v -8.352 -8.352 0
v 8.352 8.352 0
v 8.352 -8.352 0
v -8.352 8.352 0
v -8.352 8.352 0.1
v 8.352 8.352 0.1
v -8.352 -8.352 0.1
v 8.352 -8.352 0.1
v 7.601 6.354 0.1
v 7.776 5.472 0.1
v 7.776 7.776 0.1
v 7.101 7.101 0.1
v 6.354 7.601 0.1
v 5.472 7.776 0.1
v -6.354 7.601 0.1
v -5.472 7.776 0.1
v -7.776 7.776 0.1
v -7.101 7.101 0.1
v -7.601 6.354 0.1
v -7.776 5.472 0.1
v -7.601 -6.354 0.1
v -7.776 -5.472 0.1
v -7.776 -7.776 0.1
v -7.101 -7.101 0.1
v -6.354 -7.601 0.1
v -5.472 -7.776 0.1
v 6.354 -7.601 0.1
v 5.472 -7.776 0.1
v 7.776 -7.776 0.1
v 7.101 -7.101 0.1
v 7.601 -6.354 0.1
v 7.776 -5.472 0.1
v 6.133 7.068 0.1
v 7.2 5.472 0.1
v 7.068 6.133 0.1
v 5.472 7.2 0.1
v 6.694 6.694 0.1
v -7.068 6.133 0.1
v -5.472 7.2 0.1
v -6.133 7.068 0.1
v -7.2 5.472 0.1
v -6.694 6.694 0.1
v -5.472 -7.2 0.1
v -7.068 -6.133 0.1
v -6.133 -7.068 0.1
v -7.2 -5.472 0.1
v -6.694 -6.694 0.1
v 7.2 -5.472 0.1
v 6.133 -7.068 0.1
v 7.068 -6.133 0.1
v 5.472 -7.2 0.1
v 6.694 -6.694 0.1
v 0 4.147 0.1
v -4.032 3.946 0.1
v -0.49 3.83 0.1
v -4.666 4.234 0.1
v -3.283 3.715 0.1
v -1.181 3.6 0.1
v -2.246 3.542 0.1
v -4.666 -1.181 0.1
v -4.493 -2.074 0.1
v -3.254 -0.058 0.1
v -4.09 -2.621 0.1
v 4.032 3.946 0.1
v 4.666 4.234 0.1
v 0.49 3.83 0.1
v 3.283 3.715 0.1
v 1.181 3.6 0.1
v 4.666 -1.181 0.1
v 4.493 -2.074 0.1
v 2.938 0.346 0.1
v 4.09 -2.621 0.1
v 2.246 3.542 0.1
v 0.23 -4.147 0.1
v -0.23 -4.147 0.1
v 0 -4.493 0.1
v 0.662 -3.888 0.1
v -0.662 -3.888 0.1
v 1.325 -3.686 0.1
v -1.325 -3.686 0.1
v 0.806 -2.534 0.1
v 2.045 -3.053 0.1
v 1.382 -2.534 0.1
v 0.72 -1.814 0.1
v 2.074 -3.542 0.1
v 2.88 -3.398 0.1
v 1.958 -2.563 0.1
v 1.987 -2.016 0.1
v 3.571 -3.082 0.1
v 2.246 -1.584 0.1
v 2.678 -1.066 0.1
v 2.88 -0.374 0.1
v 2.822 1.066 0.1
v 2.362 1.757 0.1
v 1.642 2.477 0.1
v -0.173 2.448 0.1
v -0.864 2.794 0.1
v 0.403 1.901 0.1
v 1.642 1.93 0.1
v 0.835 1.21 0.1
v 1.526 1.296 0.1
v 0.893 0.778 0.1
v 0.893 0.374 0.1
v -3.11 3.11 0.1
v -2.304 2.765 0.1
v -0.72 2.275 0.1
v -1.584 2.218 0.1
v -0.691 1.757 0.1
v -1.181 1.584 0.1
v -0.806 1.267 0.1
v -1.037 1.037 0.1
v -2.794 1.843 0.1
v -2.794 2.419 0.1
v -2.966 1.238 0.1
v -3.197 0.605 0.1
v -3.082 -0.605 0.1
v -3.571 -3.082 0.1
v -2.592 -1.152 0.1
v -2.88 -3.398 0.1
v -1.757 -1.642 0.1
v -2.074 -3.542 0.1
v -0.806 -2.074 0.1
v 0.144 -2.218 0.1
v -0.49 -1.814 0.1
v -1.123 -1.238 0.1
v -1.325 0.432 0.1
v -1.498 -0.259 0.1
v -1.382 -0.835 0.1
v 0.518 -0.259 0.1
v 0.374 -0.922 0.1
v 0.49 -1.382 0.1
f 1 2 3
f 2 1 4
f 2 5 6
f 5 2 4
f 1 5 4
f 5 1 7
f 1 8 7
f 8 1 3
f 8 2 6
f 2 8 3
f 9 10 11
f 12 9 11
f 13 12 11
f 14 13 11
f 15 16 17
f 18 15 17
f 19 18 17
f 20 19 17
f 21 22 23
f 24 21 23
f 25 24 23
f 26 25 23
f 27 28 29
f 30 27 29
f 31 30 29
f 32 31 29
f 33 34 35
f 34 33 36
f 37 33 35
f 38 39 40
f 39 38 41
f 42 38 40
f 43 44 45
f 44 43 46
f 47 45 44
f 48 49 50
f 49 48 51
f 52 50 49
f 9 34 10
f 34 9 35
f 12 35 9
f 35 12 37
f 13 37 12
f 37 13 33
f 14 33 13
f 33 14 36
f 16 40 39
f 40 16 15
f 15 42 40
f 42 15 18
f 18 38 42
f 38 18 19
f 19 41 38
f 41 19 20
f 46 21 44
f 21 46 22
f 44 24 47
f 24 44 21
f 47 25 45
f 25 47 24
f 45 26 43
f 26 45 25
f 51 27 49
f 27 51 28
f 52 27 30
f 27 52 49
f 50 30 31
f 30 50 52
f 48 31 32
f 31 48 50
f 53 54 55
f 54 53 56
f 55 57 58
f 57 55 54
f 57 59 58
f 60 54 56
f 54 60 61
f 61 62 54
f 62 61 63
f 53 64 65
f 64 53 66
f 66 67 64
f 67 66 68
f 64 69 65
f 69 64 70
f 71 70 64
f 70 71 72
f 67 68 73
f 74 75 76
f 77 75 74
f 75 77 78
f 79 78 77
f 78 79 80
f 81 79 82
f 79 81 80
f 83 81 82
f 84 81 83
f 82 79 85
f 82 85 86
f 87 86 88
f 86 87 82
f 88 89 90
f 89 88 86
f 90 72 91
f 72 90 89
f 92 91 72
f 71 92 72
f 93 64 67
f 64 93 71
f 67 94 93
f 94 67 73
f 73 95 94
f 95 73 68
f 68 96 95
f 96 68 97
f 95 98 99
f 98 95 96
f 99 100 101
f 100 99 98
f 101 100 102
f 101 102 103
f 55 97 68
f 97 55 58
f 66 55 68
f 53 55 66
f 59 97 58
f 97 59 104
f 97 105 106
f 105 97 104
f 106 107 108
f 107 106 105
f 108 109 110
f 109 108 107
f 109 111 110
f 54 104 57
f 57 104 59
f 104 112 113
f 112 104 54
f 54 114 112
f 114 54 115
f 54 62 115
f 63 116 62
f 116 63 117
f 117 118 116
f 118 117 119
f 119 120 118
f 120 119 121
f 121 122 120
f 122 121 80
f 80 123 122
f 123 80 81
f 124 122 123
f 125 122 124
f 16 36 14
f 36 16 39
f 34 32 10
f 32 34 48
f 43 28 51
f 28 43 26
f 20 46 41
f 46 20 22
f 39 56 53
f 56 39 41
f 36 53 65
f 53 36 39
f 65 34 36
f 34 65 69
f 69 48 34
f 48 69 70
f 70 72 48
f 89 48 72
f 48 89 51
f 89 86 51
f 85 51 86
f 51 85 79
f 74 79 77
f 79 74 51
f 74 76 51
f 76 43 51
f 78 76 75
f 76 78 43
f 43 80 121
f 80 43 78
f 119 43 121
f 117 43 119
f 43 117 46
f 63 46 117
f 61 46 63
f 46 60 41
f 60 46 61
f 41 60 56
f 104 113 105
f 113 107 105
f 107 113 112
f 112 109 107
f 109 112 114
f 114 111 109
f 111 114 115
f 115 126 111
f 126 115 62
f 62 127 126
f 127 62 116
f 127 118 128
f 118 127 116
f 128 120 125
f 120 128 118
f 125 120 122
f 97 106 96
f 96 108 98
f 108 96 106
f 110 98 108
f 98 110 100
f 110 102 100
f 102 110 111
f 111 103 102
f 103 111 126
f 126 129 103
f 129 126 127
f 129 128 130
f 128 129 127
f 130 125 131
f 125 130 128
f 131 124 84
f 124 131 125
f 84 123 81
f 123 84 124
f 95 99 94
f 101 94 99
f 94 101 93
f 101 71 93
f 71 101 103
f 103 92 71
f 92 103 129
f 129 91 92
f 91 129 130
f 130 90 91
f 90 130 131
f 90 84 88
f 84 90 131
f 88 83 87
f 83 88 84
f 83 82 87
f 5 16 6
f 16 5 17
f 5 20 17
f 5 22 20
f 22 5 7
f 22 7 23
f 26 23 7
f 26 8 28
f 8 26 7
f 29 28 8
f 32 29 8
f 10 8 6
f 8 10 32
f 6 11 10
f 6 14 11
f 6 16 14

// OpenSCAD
// file: ../p/box5-12.scad
use <../lib.scad>
function ldraw_lib__box5_12() = [
// 0 Box with 5 Faces without Any Edges
// 0 Name: box5-12.dat
// 0 Author: Chris Dee [cwdee]
// 0 !LDRAW_ORG Primitive UPDATE 2009-02
// 0 !LICENSE Licensed under CC BY 4.0 : see CAreadme.txt
// 
// 0 BFC CERTIFY CCW
  [0,"BFC","CERTIFY"],
  [0,"BFC","CCW"],
// 
// 0 !HISTORY 2009-09-03 [PTadmin] Official Update 2009-02
// 
// 
// 4 16 1 1 1 1 1 -1 -1 1 -1 -1 1 1
  [4,16,1,1,1,1,1,-1,-1,1,-1,-1,1,1],
// 4 16 -1 0 1 1 0 1 1 1 1 -1 1 1
  [4,16,-1,0,1,1,0,1,1,1,1,-1,1,1],
// 4 16 -1 0 -1 -1 0 1 -1 1 1 -1 1 -1
  [4,16,-1,0,-1,-1,0,1,-1,1,1,-1,1,-1],
// 4 16 1 0 -1 -1 0 -1 -1 1 -1 1 1 -1
  [4,16,1,0,-1,-1,0,-1,-1,1,-1,1,1,-1],
// 4 16 1 0 1 1 0 -1 1 1 -1 1 1 1
  [4,16,1,0,1,1,0,-1,1,1,-1,1,1,1],
// 0
];
module ldraw_lib__box5_12(step=0, col=false, unit=2/5, alt=false, line=0.2, solid=!$preview)
    makepoly(ldraw_lib__box5_12(), step=step, col=col, unit=unit, alt=alt, line=line, solid=solid);
ldraw_lib__box5_12(line=0.2);
// file: ../p/1-4ring3.scad
use <../lib.scad>
function ldraw_lib__1_4ring3() = [
// 0 Ring  3 x 0.25
// 0 Name: 1-4ring3.dat
// 0 Author: Willy Tschager [Holly-Wood]
// 0 !LDRAW_ORG Primitive UPDATE 2024-01
// 0 !LICENSE Licensed under CC BY 4.0 : see CAreadme.txt
// 
// 0 BFC CERTIFY CCW
  [0,"BFC","CERTIFY"],
  [0,"BFC","CCW"],
// 
// 0 !HISTORY 1999-07-05 [PTadmin] Official Update 1999-05
// 0 !HISTORY 2003-01-21 [cavehop] Update Added BFC and 1 digit of significance
// 0 !HISTORY 2003-05-21 [cavehop] Corrected values as indicated by pneaster
// 0 !HISTORY 2003-06-12 [cavehop] Re-corrected values as indicated by pneaster
// 0 !HISTORY 2003-08-01 [PTadmin] Official Update 2003-02
// 0 !HISTORY 2007-06-22 [PTadmin] Header formatted for Contributor Agreement
// 0 !HISTORY 2008-07-01 [PTadmin] Official Update 2008-01
// 0 !HISTORY 2012-02-16 [Philo] Changed to CCW
// 0 !HISTORY 2012-03-30 [PTadmin] Official Update 2012-01
// 0 !HISTORY 2024-01-04 [Holly-Wood] Complete re-write, original by Karim Nassar
// 0 !HISTORY 2024-01-29 [OrionP] Official Update 2024-01
// 
// 4 16 4 0 0 3.6956 0 1.5308 2.7717 0 1.1481 3 0 0
  [4,16,4,0,0,3.6956,0,1.5308,2.7717,0,1.1481,3,0,0],
// 4 16 3.6956 0 1.5308 2.8284 0 2.8284 2.1213 0 2.1213 2.7717 0 1.1481
  [4,16,3.6956,0,1.5308,2.8284,0,2.8284,2.1213,0,2.1213,2.7717,0,1.1481],
// 4 16 2.8284 0 2.8284 1.5308 0 3.6956 1.1481 0 2.7717 2.1213 0 2.1213
  [4,16,2.8284,0,2.8284,1.5308,0,3.6956,1.1481,0,2.7717,2.1213,0,2.1213],
// 4 16 1.5308 0 3.6956 0 0 4 0 0 3 1.1481 0 2.7717
  [4,16,1.5308,0,3.6956,0,0,4,0,0,3,1.1481,0,2.7717],
// 0 // Build by LDPartEditor (PrimGen 2.X)
];
module ldraw_lib__1_4ring3(step=0, col=false, unit=2/5, alt=false, line=0.2, solid=!$preview)
    makepoly(ldraw_lib__1_4ring3(), step=step, col=col, unit=unit, alt=alt, line=line, solid=solid);
ldraw_lib__1_4ring3(line=0.2);
// file: ../p/1-4ndis.scad
use <../lib.scad>
function ldraw_lib__1_4ndis() = [
// 0 Disc Negative 0.25
// 0 Name: 1-4ndis.dat
// 0 Author: James Jessiman
// 0 !LDRAW_ORG Primitive UPDATE 2012-01
// 0 !LICENSE Licensed under CC BY 4.0 : see CAreadme.txt
// 
// 0 BFC CERTIFY CCW
  [0,"BFC","CERTIFY"],
  [0,"BFC","CCW"],
// 
// 0 !HISTORY 2002-03-23 [sbliss] Added BFC Statement
// 0 !HISTORY 2002-04-25 [PTadmin] Official Update 2002-02
// 0 !HISTORY 2007-06-22 [PTadmin] Header formatted for Contributor Agreement
// 0 !HISTORY 2008-07-01 [PTadmin] Official Update 2008-01
// 0 !HISTORY 2012-02-16 [Philo] Changed to CCW
// 0 !HISTORY 2012-03-30 [PTadmin] Official Update 2012-01
// 
// 
// 3 16 0.9239 0 0.3827 1 0 0 1 0 1
  [3,16,0.9239,0,0.3827,1,0,0,1,0,1],
// 3 16 0.7071 0 0.7071 0.9239 0 0.3827 1 0 1
  [3,16,0.7071,0,0.7071,0.9239,0,0.3827,1,0,1],
// 3 16 0.3827 0 0.9239 0.7071 0 0.7071 1 0 1
  [3,16,0.3827,0,0.9239,0.7071,0,0.7071,1,0,1],
// 3 16 0 0 1 0.3827 0 0.9239 1 0 1
  [3,16,0,0,1,0.3827,0,0.9239,1,0,1],
];
module ldraw_lib__1_4ndis(step=0, col=false, unit=2/5, alt=false, line=0.2, solid=!$preview)
    makepoly(ldraw_lib__1_4ndis(), step=step, col=col, unit=unit, alt=alt, line=line, solid=solid);
ldraw_lib__1_4ndis(line=0.2);
// file: ../p/1-4chrd.scad
use <../lib.scad>
function ldraw_lib__1_4chrd() = [
// 0 Chord 0.25
// 0 Name: 1-4chrd.dat
// 0 Author: Max Martin Richter [MMR1988]
// 0 !LDRAW_ORG Primitive UPDATE 2023-05
// 0 !LICENSE Licensed under CC BY 4.0 : see CAreadme.txt
// 
// 0 BFC CERTIFY CCW
  [0,"BFC","CERTIFY"],
  [0,"BFC","CCW"],
// 
// 0 !HISTORY 2004-04-22 [PTadmin] Official Update 2004-02
// 0 !HISTORY 2007-10-09 [PTadmin] Header formatted for Contributor Agreement
// 0 !HISTORY 2008-07-01 [PTadmin] Official Update 2008-01
// 0 !HISTORY 2012-08-02 [MMR1988] Re-creation with PrimGen2 and Rectifier
// 0 !HISTORY 2012-08-09 [PTadmin] Official Update 2012-02
// 0 !HISTORY 2023-10-27 [OrionP] Change author to MMR1988 from hafhead
// 0 !HISTORY 2023-10-31 [OrionP] Official Update 2023-05
// 
// 4 16 0.9239 0 0.3827 0.3827 0 0.9239 0 0 1 1 0 0
  [4,16,0.9239,0,0.3827,0.3827,0,0.9239,0,0,1,1,0,0],
// 3 16 0.7071 0 0.7071 0.3827 0 0.9239 0.9239 0 0.3827
  [3,16,0.7071,0,0.7071,0.3827,0,0.9239,0.9239,0,0.3827],
];
module ldraw_lib__1_4chrd(step=0, col=false, unit=2/5, alt=false, line=0.2, solid=!$preview)
    makepoly(ldraw_lib__1_4chrd(), step=step, col=col, unit=unit, alt=alt, line=line, solid=solid);
ldraw_lib__1_4chrd(line=0.2);
// main file
use <../lib.scad>
use <168135h.scad>
function ldraw_lib__168135i() = [
// 0 Sticker  2.1 x  2.1 with Fire Logo Badge
// 0 Name: 168135i.dat
// 0 Author: Takeshi Takahashi [RainbowDolphin]
// 0 !LDRAW_ORG Part UPDATE 2026-05
// 0 !LICENSE Licensed under CC BY 4.0 : see CAreadme.txt
// 
// 0 BFC CERTIFY CCW
  [0,"BFC","CERTIFY"],
  [0,"BFC","CCW"],
// 
// 0 !KEYWORDS Bricklink 6571stk01, Brickowl 674556, Fire 1994, Fire Station
// 0 !KEYWORDS Flame fighters, Rebrickable 168135, Set 6571
// 
// 0 !HISTORY 2026-05-31 [OrionP] Official Update 2026-05
// 
// 1 16 0 0 0 .72 0 0 0 1 0 0 0 .72 168135h.dat
  [1,16,0,0,0,.72,0,0,0,1,0,0,0,.72, ldraw_lib__168135h()],
];
module ldraw_lib__168135i(step=0, col=false, unit=2/5, alt=false, line=0.2, solid=!$preview)
    makepoly(ldraw_lib__168135i(), step=step, col=col, unit=unit, alt=alt, line=line, solid=solid);
ldraw_lib__168135i(line=0.2);
